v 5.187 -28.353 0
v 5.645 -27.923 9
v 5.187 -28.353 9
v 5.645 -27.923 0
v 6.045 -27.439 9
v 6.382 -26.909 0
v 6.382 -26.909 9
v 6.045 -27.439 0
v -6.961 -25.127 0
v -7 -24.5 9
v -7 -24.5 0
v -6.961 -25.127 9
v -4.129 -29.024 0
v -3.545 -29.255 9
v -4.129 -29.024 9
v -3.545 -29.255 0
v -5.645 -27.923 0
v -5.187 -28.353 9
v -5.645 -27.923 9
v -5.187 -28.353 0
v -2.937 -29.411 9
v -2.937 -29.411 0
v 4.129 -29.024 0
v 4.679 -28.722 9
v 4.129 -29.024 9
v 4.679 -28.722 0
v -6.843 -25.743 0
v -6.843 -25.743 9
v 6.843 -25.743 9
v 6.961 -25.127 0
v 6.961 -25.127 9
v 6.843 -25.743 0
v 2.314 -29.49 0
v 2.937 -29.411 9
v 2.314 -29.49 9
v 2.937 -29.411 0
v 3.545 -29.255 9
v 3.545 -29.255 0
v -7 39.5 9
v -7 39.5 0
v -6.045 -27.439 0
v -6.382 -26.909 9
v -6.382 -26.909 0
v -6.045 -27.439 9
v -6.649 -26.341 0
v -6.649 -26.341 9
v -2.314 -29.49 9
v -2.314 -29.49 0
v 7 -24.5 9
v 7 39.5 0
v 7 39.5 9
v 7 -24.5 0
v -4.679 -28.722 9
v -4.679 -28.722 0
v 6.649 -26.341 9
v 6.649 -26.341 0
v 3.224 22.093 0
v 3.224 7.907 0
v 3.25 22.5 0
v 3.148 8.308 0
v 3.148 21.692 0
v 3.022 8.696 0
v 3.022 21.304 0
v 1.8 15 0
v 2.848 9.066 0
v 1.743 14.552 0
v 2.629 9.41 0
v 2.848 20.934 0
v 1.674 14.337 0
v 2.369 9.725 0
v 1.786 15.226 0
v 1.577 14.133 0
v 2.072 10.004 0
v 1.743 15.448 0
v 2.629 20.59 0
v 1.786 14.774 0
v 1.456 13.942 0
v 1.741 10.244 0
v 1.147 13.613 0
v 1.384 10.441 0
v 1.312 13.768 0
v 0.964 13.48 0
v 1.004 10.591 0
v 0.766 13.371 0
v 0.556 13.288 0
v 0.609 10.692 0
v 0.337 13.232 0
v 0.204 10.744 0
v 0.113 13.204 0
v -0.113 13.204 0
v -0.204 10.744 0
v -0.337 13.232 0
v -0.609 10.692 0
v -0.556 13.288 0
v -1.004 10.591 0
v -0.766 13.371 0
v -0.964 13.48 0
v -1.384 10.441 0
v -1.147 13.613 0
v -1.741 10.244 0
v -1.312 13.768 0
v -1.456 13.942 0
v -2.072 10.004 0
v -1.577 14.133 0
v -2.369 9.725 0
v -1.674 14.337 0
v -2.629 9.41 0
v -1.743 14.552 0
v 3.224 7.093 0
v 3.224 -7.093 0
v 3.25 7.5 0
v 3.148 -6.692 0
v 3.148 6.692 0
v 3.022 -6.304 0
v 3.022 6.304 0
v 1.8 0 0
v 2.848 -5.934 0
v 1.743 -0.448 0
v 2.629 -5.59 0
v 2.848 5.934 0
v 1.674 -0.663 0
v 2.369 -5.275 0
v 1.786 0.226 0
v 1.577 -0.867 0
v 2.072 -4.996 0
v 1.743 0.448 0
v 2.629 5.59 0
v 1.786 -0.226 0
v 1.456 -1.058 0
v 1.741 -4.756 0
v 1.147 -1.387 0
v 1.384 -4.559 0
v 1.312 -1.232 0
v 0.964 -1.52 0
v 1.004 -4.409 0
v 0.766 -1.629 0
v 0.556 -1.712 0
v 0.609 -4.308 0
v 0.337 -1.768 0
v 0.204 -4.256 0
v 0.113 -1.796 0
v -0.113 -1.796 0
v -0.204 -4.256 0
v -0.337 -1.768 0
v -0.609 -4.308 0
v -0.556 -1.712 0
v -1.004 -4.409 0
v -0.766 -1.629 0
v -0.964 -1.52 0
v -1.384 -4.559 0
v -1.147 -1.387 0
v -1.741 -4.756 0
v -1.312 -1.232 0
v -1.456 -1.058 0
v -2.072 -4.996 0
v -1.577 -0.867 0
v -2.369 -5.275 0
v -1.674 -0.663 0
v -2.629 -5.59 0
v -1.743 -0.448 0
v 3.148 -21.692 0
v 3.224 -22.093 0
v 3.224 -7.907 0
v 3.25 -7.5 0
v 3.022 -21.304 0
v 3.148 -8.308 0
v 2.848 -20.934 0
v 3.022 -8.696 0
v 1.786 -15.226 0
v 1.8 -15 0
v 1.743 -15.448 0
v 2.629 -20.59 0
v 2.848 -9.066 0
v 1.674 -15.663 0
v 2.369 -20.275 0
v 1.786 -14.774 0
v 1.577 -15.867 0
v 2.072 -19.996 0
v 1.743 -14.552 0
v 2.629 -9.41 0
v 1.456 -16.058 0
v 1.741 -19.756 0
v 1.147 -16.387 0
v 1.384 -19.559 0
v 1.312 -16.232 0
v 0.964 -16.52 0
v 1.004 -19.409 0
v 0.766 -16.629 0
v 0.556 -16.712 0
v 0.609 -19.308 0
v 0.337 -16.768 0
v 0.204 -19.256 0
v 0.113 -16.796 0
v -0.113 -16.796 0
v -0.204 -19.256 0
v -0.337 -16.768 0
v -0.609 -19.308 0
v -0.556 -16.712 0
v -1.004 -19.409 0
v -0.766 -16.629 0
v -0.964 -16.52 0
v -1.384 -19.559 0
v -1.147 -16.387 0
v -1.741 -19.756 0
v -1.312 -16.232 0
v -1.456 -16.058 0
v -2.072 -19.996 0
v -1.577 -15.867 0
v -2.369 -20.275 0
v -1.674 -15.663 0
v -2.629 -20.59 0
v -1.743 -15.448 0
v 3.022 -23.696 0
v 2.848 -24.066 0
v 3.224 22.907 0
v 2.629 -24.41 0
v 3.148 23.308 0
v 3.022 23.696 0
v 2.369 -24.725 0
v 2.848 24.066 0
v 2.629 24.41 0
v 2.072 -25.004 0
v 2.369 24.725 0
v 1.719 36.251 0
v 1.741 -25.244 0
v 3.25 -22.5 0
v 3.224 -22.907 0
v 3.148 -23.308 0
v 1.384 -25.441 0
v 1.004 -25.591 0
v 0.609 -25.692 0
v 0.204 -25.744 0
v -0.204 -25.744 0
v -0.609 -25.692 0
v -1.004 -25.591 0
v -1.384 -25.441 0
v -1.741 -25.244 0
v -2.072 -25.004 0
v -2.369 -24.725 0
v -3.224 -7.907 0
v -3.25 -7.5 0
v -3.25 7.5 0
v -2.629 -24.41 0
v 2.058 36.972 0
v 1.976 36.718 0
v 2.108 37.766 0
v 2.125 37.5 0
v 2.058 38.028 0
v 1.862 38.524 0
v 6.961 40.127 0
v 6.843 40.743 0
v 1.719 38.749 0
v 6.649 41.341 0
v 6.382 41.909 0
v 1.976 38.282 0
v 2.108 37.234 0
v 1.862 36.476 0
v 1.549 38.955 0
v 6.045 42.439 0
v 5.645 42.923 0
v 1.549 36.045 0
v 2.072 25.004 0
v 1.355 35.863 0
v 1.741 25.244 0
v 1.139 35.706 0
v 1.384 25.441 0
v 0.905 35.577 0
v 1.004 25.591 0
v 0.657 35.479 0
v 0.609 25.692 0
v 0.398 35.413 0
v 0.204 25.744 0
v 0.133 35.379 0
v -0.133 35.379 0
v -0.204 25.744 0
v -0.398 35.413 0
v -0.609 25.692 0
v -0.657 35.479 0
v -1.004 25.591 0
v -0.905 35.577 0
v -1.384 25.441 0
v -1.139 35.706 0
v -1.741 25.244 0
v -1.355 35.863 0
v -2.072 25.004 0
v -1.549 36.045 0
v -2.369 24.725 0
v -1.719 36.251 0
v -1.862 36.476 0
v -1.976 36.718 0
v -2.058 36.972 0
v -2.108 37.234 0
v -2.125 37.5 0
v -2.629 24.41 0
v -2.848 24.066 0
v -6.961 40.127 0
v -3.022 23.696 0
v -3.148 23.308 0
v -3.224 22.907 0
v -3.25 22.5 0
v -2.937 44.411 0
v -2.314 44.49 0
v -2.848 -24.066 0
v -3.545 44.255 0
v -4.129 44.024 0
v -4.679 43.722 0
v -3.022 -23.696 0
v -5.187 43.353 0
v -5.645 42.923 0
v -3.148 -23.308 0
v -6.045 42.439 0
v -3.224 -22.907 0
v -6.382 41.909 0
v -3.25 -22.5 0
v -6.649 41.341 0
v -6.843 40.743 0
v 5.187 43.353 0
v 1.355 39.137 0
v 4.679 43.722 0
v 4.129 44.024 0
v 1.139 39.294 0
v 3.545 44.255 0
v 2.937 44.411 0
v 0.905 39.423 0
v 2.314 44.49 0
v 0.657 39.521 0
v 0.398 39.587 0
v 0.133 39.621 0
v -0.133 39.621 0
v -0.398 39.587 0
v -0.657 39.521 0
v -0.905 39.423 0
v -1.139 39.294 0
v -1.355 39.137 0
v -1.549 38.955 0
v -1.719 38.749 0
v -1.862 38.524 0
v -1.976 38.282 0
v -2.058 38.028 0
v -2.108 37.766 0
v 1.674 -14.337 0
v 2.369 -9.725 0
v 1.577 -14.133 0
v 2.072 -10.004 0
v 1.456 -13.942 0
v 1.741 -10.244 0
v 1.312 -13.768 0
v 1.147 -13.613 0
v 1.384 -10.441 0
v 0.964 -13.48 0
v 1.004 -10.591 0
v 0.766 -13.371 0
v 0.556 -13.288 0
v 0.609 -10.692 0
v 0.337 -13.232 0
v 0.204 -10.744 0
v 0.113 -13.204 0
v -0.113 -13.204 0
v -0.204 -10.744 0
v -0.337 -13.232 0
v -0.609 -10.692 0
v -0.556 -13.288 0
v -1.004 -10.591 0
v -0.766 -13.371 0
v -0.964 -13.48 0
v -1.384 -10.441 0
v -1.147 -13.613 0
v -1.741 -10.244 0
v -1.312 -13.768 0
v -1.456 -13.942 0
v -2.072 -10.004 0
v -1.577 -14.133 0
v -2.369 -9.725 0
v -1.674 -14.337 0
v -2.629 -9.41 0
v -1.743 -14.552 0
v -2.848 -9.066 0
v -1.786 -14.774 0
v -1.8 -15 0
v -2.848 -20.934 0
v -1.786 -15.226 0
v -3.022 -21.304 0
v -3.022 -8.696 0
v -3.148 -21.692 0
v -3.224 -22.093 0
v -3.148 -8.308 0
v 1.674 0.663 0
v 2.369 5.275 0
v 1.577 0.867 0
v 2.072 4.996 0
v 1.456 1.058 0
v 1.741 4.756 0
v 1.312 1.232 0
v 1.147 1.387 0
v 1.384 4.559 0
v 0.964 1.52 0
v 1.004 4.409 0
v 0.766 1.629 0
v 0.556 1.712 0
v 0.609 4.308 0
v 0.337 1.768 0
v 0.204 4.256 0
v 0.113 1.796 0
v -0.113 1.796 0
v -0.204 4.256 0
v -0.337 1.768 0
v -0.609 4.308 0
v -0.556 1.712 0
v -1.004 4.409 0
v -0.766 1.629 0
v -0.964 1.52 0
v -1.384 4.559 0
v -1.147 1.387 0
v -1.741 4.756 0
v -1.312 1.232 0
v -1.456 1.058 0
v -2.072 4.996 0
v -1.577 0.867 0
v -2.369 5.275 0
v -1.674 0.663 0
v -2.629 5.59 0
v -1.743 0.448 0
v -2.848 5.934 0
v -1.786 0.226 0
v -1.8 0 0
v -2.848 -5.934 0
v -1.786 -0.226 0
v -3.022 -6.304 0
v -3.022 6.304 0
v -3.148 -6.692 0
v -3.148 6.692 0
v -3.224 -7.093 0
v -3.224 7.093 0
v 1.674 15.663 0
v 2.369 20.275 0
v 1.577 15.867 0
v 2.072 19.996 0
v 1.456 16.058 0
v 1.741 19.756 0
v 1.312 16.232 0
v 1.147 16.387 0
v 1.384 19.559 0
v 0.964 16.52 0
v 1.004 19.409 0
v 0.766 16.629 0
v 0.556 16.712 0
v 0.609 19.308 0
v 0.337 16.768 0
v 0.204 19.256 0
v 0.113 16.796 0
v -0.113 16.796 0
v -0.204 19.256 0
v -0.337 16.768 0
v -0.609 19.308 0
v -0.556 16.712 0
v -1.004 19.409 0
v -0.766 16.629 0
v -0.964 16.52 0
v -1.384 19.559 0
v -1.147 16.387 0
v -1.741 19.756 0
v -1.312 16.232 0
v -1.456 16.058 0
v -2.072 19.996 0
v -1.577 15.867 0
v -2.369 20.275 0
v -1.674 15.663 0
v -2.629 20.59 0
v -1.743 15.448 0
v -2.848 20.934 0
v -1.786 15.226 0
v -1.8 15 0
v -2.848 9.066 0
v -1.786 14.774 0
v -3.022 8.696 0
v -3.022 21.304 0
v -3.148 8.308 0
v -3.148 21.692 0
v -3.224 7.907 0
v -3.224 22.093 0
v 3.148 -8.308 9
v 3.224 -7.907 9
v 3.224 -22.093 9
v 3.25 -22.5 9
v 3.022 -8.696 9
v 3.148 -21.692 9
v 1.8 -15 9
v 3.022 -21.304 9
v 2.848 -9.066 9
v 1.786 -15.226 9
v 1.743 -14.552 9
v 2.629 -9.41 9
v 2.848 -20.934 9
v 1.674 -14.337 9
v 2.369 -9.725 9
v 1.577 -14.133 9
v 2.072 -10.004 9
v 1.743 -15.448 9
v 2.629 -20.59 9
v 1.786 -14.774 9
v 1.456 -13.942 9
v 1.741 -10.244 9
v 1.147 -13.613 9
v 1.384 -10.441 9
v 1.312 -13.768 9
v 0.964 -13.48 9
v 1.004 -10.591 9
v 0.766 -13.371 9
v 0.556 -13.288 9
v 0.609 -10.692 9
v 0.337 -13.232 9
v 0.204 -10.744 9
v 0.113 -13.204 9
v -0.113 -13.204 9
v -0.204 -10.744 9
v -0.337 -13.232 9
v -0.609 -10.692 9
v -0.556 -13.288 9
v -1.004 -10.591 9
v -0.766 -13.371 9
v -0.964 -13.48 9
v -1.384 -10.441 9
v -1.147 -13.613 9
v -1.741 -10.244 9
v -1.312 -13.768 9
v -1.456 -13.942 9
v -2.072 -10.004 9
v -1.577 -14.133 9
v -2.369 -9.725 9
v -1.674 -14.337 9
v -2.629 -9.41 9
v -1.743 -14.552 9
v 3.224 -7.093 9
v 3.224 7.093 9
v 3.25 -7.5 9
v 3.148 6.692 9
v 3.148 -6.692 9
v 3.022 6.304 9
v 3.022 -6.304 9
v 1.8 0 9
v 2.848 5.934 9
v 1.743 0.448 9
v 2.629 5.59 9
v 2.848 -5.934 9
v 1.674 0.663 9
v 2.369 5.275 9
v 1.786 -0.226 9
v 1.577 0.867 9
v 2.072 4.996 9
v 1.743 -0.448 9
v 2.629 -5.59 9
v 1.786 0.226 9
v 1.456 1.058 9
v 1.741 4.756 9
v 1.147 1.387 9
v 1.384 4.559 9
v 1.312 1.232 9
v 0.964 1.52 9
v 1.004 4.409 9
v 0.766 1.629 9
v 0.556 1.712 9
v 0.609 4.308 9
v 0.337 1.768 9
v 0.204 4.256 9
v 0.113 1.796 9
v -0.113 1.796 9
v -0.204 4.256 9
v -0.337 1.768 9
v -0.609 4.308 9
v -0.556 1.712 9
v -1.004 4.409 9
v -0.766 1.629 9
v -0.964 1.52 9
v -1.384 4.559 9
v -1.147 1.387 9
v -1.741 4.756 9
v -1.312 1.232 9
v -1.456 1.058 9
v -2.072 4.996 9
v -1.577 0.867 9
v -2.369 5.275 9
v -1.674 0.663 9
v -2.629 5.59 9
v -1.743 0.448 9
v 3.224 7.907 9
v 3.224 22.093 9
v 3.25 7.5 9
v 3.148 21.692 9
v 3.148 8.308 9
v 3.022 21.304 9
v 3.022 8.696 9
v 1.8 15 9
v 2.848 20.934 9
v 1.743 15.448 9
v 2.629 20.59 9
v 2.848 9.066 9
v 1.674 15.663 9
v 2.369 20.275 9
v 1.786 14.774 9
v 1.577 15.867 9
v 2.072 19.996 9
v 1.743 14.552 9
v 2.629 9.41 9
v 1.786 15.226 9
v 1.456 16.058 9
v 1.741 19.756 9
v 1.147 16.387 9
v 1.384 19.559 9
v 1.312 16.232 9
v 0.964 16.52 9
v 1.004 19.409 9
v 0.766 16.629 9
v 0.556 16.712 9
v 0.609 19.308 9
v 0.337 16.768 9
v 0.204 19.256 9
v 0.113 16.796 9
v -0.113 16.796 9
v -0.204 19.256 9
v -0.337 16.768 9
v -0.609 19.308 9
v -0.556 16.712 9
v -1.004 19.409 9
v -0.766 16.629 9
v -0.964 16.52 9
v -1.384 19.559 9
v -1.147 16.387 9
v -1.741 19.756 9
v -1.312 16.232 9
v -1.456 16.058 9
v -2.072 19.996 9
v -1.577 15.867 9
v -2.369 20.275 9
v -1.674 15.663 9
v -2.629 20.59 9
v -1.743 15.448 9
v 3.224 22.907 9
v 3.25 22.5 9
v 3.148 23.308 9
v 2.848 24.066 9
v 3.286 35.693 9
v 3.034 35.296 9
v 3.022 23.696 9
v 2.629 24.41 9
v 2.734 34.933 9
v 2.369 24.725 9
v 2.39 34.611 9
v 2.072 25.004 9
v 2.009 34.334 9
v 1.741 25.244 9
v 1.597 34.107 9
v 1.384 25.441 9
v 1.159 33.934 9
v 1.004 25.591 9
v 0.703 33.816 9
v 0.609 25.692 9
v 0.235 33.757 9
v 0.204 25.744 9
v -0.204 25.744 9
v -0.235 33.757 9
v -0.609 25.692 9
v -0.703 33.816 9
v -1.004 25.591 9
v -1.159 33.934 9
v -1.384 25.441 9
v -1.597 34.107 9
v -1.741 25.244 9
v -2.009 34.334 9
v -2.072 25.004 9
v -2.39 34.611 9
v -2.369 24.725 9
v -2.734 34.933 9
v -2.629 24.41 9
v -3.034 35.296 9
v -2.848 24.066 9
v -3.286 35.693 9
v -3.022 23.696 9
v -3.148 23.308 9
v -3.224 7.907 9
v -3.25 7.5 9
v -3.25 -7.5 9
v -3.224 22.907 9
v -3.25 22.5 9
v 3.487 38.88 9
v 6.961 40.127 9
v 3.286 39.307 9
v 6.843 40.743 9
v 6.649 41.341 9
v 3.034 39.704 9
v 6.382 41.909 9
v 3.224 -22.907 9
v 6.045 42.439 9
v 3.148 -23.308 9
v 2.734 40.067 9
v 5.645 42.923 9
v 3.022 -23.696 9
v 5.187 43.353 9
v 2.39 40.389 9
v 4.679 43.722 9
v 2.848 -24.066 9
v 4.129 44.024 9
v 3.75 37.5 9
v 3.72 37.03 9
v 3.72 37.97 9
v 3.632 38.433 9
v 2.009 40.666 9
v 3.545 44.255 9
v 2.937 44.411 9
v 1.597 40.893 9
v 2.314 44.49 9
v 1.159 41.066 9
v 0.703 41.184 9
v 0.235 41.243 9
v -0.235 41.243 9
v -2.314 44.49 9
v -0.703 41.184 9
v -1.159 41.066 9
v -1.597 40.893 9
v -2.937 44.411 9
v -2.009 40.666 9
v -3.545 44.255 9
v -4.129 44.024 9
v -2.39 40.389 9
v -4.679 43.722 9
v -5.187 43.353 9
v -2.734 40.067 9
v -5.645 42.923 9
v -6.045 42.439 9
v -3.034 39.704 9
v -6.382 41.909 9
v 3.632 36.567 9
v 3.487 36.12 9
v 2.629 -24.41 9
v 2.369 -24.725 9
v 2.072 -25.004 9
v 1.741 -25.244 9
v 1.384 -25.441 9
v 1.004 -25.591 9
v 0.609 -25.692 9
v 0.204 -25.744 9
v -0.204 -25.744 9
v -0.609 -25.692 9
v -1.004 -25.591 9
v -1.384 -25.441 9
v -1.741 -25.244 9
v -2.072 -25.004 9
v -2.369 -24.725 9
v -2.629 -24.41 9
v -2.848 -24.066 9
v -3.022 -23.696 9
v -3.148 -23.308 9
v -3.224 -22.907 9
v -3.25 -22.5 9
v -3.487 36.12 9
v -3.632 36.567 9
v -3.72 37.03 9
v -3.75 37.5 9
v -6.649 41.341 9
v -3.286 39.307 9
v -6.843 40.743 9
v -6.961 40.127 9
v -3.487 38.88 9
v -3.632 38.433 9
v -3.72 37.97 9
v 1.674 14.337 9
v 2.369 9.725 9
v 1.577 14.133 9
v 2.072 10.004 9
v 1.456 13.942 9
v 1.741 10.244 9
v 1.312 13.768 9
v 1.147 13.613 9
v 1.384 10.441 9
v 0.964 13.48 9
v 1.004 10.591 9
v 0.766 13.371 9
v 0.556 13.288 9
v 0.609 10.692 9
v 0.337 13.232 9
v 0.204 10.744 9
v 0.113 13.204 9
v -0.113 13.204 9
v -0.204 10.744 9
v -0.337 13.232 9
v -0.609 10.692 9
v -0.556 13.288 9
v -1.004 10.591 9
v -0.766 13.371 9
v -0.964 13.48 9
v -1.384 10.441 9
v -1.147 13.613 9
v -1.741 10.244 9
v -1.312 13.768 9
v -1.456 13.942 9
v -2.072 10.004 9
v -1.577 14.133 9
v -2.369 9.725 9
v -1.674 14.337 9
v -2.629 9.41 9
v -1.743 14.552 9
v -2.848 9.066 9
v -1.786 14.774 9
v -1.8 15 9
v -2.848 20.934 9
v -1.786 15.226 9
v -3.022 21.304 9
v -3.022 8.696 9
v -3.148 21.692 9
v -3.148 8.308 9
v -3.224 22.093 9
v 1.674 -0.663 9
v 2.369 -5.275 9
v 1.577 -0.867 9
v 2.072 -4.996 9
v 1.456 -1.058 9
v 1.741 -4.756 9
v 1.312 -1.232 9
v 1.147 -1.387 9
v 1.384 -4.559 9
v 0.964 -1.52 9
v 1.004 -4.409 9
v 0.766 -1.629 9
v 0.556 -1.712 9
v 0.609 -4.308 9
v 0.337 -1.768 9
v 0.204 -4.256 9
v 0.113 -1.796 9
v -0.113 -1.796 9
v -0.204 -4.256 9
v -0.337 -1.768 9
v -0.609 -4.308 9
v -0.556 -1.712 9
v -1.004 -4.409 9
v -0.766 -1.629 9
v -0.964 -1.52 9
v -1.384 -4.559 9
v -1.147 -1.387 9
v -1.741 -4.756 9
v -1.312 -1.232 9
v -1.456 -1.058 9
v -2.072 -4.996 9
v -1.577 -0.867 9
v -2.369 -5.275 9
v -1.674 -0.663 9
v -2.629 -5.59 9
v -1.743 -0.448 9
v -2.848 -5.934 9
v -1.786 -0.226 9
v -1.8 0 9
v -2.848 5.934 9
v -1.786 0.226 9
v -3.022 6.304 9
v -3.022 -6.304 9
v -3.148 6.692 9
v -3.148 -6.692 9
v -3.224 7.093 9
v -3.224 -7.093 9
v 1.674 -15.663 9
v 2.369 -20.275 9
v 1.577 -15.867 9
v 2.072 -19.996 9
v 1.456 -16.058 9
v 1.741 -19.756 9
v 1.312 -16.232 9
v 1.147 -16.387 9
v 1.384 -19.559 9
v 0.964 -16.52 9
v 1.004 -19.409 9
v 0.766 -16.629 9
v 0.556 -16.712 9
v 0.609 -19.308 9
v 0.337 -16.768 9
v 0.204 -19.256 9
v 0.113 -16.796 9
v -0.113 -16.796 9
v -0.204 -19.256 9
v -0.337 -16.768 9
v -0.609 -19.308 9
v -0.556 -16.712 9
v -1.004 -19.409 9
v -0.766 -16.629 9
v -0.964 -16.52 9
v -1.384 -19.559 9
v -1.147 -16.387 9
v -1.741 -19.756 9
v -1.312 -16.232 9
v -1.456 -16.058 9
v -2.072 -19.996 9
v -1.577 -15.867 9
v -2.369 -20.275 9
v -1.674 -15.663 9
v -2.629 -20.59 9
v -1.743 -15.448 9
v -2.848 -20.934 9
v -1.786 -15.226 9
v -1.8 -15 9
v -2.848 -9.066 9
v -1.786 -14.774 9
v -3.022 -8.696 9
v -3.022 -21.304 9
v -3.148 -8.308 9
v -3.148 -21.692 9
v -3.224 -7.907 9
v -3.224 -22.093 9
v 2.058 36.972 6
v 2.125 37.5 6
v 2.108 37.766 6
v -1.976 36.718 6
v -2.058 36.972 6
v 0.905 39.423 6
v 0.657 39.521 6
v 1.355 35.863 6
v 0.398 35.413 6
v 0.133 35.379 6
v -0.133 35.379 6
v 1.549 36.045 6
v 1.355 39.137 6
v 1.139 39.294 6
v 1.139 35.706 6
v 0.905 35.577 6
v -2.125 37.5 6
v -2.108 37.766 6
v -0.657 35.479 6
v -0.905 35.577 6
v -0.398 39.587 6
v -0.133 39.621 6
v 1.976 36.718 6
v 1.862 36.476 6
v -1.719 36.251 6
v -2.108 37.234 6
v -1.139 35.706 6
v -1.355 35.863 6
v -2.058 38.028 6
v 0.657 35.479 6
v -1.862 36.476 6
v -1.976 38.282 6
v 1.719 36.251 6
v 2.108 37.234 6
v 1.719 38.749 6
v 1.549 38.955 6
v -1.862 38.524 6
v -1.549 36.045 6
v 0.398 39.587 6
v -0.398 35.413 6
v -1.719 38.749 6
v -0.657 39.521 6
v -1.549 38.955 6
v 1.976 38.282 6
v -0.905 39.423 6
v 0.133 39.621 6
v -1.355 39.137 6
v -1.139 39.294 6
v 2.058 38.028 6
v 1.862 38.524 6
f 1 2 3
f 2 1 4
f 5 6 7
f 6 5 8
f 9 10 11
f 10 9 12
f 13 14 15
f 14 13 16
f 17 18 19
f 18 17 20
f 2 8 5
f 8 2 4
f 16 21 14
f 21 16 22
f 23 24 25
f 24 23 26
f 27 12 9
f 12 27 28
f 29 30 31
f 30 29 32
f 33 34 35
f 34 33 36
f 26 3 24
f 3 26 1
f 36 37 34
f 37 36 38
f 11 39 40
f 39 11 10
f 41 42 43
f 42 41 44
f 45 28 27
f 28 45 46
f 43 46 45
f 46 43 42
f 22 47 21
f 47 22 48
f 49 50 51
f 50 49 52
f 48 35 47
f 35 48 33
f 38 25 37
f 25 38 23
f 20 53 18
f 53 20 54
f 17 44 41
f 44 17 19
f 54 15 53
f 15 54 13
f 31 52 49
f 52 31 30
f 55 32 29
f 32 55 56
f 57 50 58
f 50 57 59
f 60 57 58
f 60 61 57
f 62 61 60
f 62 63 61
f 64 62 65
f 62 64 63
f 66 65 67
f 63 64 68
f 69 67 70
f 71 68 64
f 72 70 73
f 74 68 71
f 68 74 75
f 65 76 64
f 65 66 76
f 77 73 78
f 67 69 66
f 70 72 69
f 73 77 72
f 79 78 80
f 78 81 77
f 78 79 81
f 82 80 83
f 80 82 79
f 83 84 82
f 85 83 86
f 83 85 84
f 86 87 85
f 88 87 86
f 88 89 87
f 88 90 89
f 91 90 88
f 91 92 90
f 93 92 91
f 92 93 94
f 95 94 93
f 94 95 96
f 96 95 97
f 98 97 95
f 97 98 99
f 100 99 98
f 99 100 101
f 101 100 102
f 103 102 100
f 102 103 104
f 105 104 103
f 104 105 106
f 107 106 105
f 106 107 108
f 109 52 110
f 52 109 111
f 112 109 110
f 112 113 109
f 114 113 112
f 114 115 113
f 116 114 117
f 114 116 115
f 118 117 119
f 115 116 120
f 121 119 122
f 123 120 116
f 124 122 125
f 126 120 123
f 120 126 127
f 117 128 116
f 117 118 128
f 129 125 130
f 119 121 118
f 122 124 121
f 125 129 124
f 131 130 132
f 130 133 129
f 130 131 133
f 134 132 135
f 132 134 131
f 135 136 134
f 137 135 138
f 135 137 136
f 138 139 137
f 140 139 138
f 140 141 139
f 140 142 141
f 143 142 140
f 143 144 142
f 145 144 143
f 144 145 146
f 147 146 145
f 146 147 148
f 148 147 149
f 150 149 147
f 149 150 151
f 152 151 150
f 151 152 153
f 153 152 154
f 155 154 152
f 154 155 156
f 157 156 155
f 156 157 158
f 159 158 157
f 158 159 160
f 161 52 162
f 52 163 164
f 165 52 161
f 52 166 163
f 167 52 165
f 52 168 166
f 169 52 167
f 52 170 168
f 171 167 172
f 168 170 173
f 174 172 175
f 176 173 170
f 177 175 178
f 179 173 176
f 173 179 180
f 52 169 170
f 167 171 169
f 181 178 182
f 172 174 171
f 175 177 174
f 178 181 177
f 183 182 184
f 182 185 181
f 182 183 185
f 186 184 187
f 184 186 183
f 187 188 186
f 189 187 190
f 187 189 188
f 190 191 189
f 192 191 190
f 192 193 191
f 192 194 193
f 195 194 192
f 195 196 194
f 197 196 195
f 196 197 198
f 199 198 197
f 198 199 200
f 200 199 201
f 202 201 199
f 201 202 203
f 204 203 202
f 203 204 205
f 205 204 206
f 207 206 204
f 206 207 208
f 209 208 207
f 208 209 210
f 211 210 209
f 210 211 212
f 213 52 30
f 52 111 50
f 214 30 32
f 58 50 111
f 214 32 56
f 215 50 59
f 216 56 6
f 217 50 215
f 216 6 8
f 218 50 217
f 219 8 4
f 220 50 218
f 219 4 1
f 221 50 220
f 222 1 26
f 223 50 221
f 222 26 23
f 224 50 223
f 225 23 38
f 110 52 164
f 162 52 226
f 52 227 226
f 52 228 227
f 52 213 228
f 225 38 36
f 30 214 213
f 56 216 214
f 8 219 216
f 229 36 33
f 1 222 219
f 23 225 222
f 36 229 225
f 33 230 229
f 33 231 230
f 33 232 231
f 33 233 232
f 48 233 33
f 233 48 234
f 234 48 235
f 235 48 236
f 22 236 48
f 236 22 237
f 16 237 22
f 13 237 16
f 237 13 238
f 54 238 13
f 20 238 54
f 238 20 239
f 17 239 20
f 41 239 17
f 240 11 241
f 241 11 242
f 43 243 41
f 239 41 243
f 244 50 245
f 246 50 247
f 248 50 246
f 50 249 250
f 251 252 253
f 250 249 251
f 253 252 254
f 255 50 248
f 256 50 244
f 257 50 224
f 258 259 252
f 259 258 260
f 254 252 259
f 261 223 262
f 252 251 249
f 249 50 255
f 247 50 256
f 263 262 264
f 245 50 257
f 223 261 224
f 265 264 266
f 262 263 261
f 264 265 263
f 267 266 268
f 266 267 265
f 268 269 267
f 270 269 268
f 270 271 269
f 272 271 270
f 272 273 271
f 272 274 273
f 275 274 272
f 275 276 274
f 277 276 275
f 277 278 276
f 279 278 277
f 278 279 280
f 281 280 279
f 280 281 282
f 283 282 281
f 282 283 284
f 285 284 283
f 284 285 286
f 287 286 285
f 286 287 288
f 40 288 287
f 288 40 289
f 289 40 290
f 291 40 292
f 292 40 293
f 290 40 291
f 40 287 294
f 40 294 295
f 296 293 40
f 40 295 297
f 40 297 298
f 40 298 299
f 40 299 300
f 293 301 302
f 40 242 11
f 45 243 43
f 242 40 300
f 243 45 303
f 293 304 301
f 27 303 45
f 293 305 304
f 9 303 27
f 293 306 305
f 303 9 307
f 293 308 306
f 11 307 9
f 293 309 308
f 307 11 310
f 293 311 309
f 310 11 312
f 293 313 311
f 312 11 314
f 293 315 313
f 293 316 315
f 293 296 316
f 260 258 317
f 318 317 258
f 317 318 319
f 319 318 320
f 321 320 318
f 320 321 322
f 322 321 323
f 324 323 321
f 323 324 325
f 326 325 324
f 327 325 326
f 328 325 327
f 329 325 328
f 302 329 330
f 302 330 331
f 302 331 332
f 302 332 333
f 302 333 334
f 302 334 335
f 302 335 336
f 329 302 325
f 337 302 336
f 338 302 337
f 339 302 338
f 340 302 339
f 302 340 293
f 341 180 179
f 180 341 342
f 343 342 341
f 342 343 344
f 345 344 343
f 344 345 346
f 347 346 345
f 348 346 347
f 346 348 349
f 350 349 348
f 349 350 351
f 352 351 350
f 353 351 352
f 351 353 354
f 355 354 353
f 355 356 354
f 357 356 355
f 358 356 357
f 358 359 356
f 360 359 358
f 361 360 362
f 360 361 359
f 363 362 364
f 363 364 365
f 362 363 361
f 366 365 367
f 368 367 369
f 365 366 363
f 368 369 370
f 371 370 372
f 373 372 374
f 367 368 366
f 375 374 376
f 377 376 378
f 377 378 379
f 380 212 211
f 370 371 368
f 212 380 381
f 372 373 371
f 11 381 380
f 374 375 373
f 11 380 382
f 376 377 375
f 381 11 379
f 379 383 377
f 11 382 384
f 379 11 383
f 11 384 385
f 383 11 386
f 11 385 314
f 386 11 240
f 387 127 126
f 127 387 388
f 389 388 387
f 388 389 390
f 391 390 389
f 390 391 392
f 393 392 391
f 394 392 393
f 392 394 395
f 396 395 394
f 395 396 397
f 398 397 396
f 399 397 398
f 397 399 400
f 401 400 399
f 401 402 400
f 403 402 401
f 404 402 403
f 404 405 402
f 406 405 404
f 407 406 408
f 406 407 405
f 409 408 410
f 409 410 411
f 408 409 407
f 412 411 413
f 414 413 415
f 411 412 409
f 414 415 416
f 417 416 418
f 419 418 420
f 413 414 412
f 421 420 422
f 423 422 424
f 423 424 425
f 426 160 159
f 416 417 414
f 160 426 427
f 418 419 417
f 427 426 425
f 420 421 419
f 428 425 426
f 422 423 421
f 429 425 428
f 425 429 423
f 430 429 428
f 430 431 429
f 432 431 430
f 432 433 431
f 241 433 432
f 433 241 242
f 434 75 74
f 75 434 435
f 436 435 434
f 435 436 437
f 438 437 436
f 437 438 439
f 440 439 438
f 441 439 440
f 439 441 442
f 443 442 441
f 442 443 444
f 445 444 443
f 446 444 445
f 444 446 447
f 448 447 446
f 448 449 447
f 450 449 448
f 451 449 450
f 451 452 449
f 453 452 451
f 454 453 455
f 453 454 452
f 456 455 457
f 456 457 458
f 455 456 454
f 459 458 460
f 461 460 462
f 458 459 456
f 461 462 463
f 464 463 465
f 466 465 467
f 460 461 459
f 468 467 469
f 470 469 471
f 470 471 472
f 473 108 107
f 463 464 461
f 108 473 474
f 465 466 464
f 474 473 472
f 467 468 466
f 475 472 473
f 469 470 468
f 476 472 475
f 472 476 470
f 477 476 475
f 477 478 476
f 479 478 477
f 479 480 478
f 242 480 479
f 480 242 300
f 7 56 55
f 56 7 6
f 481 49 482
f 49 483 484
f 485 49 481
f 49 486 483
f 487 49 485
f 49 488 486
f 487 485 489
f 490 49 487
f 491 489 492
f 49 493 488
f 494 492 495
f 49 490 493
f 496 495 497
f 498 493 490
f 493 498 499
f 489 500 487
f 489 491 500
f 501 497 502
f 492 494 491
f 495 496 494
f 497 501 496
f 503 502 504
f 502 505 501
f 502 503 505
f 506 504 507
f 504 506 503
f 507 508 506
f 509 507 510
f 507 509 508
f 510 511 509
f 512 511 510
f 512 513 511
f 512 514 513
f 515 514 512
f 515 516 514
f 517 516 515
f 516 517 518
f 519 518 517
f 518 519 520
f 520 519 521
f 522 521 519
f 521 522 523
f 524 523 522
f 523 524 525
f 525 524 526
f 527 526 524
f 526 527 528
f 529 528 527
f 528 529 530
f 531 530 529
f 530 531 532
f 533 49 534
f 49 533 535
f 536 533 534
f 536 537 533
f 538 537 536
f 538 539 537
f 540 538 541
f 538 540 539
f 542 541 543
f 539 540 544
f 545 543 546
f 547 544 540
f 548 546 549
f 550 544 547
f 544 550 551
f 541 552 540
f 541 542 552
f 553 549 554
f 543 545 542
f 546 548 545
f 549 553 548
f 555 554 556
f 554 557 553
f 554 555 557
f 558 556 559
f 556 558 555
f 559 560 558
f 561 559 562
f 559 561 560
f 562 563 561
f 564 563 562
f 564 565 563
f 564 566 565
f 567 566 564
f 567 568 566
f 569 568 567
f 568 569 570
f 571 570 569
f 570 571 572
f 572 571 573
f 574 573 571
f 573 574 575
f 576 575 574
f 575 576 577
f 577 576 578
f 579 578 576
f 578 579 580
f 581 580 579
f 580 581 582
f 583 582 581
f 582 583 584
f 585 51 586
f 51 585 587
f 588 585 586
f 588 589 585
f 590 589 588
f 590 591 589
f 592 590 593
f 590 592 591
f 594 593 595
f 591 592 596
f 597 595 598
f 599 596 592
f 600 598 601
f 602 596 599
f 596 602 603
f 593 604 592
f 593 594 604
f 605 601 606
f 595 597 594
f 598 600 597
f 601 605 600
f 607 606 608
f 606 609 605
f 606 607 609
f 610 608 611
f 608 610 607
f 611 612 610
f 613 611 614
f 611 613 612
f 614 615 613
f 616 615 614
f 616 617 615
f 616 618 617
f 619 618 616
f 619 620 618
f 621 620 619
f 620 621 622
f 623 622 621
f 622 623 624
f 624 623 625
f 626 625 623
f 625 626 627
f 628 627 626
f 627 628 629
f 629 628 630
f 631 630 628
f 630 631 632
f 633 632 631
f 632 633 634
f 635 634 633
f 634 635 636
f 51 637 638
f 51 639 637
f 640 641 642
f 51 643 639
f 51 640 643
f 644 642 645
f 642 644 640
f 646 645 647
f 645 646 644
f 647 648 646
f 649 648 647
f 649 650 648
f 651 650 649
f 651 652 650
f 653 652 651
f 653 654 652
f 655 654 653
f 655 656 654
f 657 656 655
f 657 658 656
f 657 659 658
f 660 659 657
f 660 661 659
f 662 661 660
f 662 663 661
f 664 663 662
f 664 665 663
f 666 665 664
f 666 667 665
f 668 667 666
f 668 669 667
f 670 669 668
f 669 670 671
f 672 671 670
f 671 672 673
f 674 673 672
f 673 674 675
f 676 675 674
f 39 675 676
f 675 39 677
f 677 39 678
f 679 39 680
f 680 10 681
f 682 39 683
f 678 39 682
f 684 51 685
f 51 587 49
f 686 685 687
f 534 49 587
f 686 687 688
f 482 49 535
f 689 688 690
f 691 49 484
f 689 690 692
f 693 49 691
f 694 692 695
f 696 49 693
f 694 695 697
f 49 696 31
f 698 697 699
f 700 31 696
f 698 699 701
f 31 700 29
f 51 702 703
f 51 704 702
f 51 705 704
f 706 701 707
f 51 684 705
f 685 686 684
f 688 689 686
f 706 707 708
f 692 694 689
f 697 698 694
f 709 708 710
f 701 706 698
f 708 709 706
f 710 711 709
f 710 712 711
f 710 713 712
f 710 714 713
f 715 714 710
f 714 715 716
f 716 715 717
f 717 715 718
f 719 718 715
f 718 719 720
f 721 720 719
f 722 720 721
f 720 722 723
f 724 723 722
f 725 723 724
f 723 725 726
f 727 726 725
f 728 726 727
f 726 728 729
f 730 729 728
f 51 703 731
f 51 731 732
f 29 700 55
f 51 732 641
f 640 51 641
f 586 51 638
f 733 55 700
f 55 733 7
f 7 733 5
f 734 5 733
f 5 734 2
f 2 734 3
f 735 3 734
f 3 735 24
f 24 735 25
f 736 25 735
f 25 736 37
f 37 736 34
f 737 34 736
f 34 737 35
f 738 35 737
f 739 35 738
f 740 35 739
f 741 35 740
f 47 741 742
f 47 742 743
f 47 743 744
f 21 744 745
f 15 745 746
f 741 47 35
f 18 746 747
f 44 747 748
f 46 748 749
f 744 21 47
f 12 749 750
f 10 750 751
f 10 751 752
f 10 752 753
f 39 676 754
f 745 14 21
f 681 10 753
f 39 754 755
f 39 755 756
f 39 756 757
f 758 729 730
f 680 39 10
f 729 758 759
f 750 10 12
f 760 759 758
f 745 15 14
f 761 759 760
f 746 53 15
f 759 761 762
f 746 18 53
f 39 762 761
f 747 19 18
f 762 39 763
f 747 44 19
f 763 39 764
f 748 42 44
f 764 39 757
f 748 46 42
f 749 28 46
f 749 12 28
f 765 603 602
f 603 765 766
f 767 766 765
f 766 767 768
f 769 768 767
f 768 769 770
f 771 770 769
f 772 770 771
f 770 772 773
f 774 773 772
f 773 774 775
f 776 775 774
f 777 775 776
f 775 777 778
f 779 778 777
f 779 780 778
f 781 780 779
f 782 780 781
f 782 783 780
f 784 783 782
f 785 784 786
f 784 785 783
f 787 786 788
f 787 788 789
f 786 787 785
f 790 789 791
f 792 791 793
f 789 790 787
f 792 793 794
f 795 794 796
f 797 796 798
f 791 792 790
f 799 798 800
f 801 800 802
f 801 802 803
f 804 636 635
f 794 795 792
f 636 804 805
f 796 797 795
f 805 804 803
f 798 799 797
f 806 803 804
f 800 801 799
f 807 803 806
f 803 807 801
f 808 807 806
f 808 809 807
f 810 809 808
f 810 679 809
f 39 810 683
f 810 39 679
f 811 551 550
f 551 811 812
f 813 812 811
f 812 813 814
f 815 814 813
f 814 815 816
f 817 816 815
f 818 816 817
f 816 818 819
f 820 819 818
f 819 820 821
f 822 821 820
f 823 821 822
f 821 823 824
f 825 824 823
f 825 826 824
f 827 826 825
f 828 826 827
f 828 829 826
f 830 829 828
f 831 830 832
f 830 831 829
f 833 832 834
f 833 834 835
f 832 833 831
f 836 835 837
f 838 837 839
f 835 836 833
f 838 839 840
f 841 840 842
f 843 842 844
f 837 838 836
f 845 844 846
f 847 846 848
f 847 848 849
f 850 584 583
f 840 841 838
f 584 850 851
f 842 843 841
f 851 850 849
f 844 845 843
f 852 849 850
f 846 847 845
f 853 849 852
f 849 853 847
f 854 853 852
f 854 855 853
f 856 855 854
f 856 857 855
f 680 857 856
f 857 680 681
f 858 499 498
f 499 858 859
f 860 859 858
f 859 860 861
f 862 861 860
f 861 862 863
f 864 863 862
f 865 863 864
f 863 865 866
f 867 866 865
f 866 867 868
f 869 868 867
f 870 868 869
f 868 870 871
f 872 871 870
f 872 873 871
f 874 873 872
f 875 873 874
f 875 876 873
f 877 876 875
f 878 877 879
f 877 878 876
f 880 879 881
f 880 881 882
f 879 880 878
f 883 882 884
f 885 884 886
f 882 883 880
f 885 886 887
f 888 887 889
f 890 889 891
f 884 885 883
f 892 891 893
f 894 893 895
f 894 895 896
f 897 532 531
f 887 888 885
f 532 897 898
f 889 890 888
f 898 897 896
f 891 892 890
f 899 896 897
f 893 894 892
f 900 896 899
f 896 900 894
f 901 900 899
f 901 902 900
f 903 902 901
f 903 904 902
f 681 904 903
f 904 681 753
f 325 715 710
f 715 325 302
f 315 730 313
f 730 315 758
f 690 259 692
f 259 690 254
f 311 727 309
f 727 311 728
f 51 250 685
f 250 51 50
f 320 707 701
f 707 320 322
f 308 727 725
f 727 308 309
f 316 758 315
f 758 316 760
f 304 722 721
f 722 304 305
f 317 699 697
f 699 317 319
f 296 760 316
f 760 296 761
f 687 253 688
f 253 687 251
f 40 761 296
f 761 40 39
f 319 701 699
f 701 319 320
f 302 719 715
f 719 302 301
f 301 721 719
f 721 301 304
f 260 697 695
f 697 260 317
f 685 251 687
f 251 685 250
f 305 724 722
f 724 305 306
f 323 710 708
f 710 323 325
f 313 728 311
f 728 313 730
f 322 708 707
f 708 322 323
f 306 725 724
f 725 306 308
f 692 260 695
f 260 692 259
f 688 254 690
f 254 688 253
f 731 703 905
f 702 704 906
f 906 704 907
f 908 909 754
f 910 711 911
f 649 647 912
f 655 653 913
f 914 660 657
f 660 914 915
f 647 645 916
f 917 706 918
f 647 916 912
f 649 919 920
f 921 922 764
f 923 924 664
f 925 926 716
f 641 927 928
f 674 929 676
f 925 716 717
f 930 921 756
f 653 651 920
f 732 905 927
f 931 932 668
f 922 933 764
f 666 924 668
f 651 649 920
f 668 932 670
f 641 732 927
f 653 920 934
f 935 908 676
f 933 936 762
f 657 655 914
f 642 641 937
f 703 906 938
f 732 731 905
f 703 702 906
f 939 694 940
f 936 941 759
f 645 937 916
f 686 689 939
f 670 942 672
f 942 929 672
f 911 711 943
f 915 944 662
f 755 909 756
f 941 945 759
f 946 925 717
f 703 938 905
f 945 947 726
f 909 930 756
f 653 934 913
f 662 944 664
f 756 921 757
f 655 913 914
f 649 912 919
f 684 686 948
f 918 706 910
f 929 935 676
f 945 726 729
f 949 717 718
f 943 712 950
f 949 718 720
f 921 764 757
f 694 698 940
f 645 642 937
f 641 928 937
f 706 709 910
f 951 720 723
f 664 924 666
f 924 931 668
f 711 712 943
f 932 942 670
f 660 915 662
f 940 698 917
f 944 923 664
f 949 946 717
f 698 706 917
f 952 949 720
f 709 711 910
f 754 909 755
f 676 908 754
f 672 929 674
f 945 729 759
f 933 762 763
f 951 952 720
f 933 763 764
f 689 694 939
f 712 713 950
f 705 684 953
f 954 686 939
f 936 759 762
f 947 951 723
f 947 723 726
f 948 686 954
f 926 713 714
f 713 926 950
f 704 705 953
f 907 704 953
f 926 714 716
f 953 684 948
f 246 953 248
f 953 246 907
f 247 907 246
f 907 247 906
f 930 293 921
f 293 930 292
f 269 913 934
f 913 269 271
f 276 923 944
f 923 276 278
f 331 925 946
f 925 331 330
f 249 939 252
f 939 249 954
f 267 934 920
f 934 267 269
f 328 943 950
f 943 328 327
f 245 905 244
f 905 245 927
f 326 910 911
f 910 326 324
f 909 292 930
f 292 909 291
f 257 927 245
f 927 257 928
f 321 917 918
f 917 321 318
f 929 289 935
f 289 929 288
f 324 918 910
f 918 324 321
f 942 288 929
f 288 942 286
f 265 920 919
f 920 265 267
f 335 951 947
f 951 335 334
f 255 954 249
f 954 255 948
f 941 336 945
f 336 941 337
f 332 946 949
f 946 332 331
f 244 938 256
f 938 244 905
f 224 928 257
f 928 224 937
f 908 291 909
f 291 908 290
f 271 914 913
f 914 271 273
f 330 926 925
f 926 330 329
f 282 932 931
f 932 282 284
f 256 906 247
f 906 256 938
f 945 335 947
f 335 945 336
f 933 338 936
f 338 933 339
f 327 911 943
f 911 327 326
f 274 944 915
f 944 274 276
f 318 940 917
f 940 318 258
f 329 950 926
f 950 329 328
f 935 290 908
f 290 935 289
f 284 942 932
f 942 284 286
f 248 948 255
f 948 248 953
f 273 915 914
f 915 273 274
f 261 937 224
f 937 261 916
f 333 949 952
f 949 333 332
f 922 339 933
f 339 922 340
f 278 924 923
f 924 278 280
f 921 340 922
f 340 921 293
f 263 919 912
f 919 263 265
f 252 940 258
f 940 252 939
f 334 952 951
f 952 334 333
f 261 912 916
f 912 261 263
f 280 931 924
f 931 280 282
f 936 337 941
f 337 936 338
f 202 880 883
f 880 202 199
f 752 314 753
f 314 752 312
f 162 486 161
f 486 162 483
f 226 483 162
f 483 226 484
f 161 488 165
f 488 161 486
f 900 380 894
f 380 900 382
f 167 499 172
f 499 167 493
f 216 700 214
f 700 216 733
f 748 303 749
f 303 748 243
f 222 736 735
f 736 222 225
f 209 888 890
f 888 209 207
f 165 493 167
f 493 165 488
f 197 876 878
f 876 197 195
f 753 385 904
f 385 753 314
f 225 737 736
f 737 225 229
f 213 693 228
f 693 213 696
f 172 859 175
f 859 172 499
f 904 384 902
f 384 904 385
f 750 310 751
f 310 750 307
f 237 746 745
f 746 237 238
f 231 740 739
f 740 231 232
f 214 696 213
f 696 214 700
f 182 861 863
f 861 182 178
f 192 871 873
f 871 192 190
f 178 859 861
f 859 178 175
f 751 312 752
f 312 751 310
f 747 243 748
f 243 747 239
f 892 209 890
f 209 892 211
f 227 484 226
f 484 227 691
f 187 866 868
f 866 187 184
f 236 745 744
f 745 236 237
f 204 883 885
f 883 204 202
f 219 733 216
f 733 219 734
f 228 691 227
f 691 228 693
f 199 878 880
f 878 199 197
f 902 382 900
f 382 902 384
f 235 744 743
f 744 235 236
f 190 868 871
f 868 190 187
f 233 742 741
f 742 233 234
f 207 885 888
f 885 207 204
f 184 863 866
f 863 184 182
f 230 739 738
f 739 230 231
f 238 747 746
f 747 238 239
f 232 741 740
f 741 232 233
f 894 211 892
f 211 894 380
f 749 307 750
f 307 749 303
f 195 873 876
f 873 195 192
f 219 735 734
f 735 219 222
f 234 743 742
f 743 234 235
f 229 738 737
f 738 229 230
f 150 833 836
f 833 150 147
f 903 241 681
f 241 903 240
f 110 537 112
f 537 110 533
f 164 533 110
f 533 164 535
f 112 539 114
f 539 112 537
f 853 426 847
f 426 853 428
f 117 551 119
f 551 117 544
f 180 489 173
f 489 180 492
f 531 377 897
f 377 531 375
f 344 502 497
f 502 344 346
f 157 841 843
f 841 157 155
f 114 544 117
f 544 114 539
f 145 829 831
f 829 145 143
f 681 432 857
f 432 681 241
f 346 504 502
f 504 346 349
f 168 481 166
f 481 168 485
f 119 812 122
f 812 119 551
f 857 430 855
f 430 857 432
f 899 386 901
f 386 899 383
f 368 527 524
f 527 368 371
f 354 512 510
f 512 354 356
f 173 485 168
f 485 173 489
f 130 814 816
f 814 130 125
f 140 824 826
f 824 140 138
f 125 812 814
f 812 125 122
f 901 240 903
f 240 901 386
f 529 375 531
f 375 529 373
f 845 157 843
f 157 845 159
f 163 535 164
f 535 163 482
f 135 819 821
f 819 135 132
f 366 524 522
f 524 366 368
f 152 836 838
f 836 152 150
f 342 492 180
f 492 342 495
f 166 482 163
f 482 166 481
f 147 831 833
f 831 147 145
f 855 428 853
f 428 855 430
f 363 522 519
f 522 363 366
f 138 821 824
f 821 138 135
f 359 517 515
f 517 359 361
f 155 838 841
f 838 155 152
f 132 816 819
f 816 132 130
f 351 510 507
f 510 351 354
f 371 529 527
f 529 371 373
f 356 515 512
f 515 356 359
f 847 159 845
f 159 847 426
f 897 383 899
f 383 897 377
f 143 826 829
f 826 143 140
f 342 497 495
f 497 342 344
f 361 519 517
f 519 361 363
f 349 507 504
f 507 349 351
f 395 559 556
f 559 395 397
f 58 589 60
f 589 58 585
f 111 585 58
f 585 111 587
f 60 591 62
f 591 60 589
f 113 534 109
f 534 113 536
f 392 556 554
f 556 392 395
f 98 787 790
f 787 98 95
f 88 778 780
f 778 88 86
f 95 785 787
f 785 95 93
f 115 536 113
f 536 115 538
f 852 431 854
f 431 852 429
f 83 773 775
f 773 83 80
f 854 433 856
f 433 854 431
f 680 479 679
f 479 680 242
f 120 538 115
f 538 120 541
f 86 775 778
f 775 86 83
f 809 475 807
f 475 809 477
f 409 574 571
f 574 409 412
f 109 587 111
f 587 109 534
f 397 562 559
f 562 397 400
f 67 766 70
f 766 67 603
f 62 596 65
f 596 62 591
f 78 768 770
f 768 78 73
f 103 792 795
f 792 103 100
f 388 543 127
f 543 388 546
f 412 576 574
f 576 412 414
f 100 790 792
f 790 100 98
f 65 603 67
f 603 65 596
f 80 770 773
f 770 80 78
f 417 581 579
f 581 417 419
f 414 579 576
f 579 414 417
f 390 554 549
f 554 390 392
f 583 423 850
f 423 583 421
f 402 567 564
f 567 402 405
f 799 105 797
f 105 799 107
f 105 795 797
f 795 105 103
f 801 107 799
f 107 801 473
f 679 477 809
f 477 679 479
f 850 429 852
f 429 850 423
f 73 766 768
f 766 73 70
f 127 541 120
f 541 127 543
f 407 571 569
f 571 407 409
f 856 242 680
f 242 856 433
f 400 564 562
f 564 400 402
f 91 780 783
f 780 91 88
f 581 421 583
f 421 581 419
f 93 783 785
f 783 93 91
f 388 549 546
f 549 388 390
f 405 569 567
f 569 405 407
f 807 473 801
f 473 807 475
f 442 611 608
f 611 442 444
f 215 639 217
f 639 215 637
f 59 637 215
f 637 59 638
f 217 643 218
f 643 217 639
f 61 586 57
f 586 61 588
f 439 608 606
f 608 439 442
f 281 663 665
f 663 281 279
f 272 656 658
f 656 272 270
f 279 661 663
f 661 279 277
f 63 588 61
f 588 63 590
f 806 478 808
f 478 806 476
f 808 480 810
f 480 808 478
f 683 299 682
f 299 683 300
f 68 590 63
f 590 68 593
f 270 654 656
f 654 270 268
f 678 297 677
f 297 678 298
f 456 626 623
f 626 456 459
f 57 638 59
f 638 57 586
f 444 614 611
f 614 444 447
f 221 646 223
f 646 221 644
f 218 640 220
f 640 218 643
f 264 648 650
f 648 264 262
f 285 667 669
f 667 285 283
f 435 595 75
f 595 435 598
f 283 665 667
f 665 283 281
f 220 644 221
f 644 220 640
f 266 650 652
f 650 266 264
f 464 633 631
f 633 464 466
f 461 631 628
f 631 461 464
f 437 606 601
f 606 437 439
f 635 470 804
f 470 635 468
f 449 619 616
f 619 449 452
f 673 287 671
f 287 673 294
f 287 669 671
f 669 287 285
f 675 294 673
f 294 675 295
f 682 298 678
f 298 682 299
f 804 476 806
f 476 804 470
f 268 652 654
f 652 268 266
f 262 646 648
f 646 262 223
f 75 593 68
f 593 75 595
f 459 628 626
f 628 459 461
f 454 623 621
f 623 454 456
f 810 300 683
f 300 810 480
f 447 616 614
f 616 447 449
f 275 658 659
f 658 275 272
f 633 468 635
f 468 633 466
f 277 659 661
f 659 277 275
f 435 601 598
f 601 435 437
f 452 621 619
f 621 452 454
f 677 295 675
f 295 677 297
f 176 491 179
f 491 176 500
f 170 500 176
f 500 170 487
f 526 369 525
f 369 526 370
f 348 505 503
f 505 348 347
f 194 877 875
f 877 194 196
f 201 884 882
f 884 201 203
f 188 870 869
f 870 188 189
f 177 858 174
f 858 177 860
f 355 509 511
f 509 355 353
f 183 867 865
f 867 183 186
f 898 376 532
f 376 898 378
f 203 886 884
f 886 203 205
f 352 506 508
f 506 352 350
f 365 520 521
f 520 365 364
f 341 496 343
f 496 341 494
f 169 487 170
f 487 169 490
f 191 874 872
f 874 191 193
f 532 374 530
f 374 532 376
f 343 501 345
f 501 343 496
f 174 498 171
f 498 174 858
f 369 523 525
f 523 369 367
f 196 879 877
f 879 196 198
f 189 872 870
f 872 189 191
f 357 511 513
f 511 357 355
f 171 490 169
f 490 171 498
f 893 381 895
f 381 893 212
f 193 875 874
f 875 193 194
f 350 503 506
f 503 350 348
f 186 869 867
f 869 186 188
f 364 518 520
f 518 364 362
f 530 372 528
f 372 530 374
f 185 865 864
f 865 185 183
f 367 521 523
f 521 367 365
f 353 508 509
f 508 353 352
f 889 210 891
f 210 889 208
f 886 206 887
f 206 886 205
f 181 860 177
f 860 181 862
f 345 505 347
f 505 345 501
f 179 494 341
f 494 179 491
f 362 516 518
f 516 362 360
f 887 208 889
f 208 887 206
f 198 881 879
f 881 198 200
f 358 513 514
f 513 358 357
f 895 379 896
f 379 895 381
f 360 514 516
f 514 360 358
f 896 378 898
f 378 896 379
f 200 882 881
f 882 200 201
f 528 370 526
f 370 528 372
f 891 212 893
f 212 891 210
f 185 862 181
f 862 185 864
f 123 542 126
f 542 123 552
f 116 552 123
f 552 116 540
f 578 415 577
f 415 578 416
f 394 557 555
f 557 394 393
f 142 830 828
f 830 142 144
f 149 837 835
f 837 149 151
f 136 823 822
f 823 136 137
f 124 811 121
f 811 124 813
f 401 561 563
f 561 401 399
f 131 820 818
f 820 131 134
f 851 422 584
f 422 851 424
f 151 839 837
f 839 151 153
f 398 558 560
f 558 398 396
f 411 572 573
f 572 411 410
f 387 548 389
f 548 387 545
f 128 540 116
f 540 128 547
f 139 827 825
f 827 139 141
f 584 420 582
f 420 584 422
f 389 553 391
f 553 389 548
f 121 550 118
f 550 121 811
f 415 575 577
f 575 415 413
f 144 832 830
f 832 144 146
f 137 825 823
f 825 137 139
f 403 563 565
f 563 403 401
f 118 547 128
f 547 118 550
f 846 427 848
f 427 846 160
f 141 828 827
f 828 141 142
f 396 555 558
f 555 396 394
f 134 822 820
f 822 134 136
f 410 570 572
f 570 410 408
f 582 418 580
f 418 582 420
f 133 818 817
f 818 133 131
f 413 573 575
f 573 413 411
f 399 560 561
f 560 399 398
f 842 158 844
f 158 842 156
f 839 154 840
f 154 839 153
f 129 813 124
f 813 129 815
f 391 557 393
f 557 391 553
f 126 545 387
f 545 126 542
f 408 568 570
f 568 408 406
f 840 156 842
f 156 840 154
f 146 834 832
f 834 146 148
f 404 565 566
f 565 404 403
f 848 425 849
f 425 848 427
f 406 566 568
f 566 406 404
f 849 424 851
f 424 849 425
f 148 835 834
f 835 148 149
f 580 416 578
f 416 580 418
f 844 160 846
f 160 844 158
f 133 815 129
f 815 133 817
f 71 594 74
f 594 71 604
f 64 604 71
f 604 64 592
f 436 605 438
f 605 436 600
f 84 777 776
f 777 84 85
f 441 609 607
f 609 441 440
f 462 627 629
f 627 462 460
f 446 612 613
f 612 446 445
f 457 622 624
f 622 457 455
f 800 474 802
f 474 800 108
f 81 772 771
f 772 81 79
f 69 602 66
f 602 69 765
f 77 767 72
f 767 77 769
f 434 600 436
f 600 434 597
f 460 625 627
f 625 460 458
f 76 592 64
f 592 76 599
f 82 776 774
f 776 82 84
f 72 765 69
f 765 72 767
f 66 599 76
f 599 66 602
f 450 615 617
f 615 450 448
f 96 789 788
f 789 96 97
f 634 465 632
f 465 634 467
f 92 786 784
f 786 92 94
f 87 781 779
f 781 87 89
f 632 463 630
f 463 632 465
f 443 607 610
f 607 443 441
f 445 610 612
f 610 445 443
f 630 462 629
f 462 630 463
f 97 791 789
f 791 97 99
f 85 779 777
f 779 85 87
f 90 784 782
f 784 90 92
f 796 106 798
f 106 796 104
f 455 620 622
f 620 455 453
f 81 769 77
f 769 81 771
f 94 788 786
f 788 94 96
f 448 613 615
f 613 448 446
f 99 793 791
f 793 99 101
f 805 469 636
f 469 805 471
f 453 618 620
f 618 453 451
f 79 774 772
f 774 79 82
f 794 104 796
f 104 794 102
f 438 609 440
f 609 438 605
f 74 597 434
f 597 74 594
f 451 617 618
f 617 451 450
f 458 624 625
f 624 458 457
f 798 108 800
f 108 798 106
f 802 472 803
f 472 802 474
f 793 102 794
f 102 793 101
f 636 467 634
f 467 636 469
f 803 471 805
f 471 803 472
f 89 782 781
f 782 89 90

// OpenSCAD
$fn = 50;


difference() {
	union() {
		hull() {
			translate(v = [-2.0000000000, 24.5000000000, 0]) {
				cylinder(h = 9, r = 5);
			}
			translate(v = [2.0000000000, 24.5000000000, 0]) {
				cylinder(h = 9, r = 5);
			}
			translate(v = [-2.0000000000, -24.5000000000, 0]) {
				cylinder(h = 9, r = 5);
			}
			translate(v = [2.0000000000, -24.5000000000, 0]) {
				cylinder(h = 9, r = 5);
			}
		}
		translate(v = [0.0000000000, 30.0000000000, 0]) {
			hull() {
				translate(v = [-2.0000000000, 9.5000000000, 0]) {
					cylinder(h = 9, r = 5);
				}
				translate(v = [2.0000000000, 9.5000000000, 0]) {
					cylinder(h = 9, r = 5);
				}
				translate(v = [-2.0000000000, -9.5000000000, 0]) {
					cylinder(h = 9, r = 5);
				}
				translate(v = [2.0000000000, -9.5000000000, 0]) {
					cylinder(h = 9, r = 5);
				}
			}
		}
		translate(v = [0.0000000000, 30.0000000000, 0]) {
			hull() {
				translate(v = [-2.0000000000, 9.5000000000, 0]) {
					cylinder(h = 9, r = 5);
				}
				translate(v = [2.0000000000, 9.5000000000, 0]) {
					cylinder(h = 9, r = 5);
				}
				translate(v = [-2.0000000000, -9.5000000000, 0]) {
					cylinder(h = 9, r = 5);
				}
				translate(v = [2.0000000000, -9.5000000000, 0]) {
					cylinder(h = 9, r = 5);
				}
			}
		}
	}
	union() {
		translate(v = [0.0000000000, 37.5000000000, 9]) {
			rotate(a = [0, 0, 0]) {
				difference() {
					union() {
						#translate(v = [0, 0, -9.0000000000]) {
							cylinder(h = 9, r = 2.0000000000);
						}
						#translate(v = [0, 0, -3]) {
							cylinder(h = 3, r1 = 2.1250000000, r2 = 3.7500000000);
						}
						#translate(v = [0, 0, -9.0000000000]) {
							cylinder(h = 9, r = 2.1250000000);
						}
						#translate(v = [0, 0, -9.0000000000]) {
							cylinder(h = 9, r = 2.0000000000);
						}
					}
					union();
				}
			}
		}
		translate(v = [0.0000000000, 37.5000000000, 9]) {
			rotate(a = [0, 0, 0]) {
				difference() {
					union() {
						#translate(v = [0, 0, -9.0000000000]) {
							cylinder(h = 9, r = 2.0000000000);
						}
						#translate(v = [0, 0, -3]) {
							cylinder(h = 3, r1 = 2.1250000000, r2 = 3.7500000000);
						}
						#translate(v = [0, 0, -9.0000000000]) {
							cylinder(h = 9, r = 2.1250000000);
						}
						#translate(v = [0, 0, -9.0000000000]) {
							cylinder(h = 9, r = 2.0000000000);
						}
					}
					union();
				}
			}
		}
		translate(v = [0.0000000000, -22.5000000000, 0]) {
			translate(v = [0, 0, -100]) {
				cylinder(h = 200, r = 3.2500000000);
			}
		}
		translate(v = [0.0000000000, -7.5000000000, 0]) {
			translate(v = [0, 0, -100]) {
				cylinder(h = 200, r = 3.2500000000);
			}
		}
		translate(v = [0.0000000000, 7.5000000000, 0]) {
			translate(v = [0, 0, -100]) {
				cylinder(h = 200, r = 3.2500000000);
			}
		}
		translate(v = [0.0000000000, 22.5000000000, 0]) {
			translate(v = [0, 0, -100]) {
				cylinder(h = 200, r = 3.2500000000);
			}
		}
		translate(v = [0.0000000000, -22.5000000000, 0]) {
			translate(v = [0, 0, -100]) {
				cylinder(h = 200, r = 1.8000000000);
			}
		}
		translate(v = [0.0000000000, -15.0000000000, 0]) {
			translate(v = [0, 0, -100]) {
				cylinder(h = 200, r = 1.8000000000);
			}
		}
		translate(v = [0.0000000000, -7.5000000000, 0]) {
			translate(v = [0, 0, -100]) {
				cylinder(h = 200, r = 1.8000000000);
			}
		}
		translate(v = [0, 0, -100]) {
			cylinder(h = 200, r = 1.8000000000);
		}
		translate(v = [0.0000000000, 7.5000000000, 0]) {
			translate(v = [0, 0, -100]) {
				cylinder(h = 200, r = 1.8000000000);
			}
		}
		translate(v = [0.0000000000, 15.0000000000, 0]) {
			translate(v = [0, 0, -100]) {
				cylinder(h = 200, r = 1.8000000000);
			}
		}
		translate(v = [0.0000000000, 22.5000000000, 0]) {
			translate(v = [0, 0, -100]) {
				cylinder(h = 200, r = 1.8000000000);
			}
		}
	}
}
